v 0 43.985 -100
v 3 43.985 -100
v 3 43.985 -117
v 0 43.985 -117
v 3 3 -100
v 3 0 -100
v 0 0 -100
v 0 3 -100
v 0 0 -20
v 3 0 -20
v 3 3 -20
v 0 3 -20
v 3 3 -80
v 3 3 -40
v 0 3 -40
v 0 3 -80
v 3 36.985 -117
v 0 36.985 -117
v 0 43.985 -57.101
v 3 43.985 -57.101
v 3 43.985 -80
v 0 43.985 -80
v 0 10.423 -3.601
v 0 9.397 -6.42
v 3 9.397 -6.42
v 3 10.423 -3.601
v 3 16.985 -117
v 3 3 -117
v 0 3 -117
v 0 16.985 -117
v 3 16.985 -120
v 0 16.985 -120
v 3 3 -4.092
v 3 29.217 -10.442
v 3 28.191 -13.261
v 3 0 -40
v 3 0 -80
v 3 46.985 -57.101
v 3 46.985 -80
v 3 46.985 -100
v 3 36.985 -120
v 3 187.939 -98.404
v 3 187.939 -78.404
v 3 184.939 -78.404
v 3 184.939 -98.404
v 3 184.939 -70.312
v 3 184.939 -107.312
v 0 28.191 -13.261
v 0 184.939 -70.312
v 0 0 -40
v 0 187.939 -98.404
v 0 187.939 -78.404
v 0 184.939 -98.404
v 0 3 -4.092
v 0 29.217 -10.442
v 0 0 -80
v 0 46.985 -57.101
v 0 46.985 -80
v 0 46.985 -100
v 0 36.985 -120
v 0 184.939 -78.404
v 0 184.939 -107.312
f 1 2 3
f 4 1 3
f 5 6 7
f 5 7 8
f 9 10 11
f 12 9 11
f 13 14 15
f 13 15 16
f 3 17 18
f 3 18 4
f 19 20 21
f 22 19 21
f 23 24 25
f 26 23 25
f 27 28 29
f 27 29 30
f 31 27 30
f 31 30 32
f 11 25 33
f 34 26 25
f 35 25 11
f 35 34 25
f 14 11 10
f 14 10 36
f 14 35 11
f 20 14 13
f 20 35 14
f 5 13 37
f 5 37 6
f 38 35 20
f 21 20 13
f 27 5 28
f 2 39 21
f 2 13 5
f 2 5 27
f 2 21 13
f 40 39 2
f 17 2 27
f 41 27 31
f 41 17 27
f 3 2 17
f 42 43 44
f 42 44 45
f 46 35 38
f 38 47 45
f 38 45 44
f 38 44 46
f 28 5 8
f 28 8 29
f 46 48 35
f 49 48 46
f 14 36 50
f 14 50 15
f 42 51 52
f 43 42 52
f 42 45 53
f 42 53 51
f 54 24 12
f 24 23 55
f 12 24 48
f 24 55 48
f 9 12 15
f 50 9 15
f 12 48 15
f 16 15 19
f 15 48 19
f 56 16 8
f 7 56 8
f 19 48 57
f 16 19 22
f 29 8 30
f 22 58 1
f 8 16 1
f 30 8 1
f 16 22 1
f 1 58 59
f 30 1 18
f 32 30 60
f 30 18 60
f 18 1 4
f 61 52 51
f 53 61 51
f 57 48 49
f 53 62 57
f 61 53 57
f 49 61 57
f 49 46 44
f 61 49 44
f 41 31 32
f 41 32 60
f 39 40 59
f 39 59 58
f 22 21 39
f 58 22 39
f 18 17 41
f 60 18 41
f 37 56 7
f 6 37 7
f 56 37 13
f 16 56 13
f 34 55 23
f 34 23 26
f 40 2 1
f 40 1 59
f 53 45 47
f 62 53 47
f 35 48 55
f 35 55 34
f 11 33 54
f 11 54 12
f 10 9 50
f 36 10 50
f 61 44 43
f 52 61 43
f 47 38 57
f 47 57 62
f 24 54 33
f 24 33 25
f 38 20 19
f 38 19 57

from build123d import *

# Parameters (mm, degrees)
BOSS_EXTRUDE1_DEPTH = 3
CUT_EXTRUDE1_DEPTH  = 267.131484195
SKETCH3_W           = 29.976768642
SKETCH3_H           = 52.268511193
CUT_EXTRUDE2_DEPTH  = 233.651187464
SKETCH5_W           = 11.091910703
SKETCH5_H           = 3
SKETCH5_W_2         = 10
CUT_EXTRUDE4_DEPTH  = 224.001992956
SKETCH6_W           = 20
SKETCH6_H           = 3
CUT_EXTRUDE5_DEPTH  = 224.001992956
SKETCH7_W           = 40
SKETCH7_H           = 3
CUT_EXTRUDE6_DEPTH  = 224.001992956
SKETCH8_W           = 20
SKETCH8_H           = 3
SKETCH8_W_2         = 22.898992834
CUT_EXTRUDE7_DEPTH  = 224.001992956
SKETCH10_W          = 3
SKETCH10_H          = 7
SKETCH10_H_2        = 13.984631039
CUT_EXTRUDE9_DEPTH  = 224.001992956
CUT_EXTRUDE10_REACH = 225.002
SKETCH12_W          = 3
SKETCH12_H          = 20
BOSS_EXTRUDE2_DEPTH = 3


with BuildPart() as part:
    # Sketch1 → Boss-Extrude1 (new body)
    with BuildSketch(Plane(origin=(0, 0, 0), x_dir=(0, 0, -1), z_dir=(1, 0, 0))):
        Polygon((0, 0), (120, 0), (188.404028665, 187.938524157), (68.404028665, 187.938524157), align=None)
    extrude(amount=BOSS_EXTRUDE1_DEPTH)

    # Sketch2 → Cut-Extrude1 (cut, through all)
    with BuildSketch(Plane(origin=(3, 0, 0), x_dir=(0, 0, -1), z_dir=(1, 0, 0))):
        Polygon((188.404028665, 187.938524157), (137.101007166, 46.984631039), (57.101007166, 46.984631039), (108.404028665, 187.938524157), align=None)
    extrude(amount=-CUT_EXTRUDE1_DEPTH, mode=Mode.SUBTRACT)

    # Sketch3 → Cut-Extrude2 (cut, through all)
    with BuildSketch(Plane(origin=(3, 0, 0), x_dir=(0, 0, -1), z_dir=(1, 0, 0))):
        with Locations((134.988384321, 26.134255597)):
            Rectangle(SKETCH3_W, SKETCH3_H)
    extrude(amount=-CUT_EXTRUDE2_DEPTH, mode=Mode.SUBTRACT)

    # Sketch5 → Cut-Extrude4 (cut, through all)
    with BuildSketch(Plane(origin=(3, 0, 0), x_dir=(0, 0, -1), z_dir=(1, 0, 0))):
        with Locations((72.858073314, 186.438524157)):
            Rectangle(SKETCH5_W, SKETCH5_H)
        with Locations((103.404028665, 186.438524157)):
            Rectangle(SKETCH5_W_2, SKETCH5_H)
    extrude(amount=-CUT_EXTRUDE4_DEPTH, mode=Mode.SUBTRACT)

    # Sketch6 → Cut-Extrude5 (cut, through all)
    with BuildSketch(Plane(origin=(3, 0, 0), x_dir=(0, 0, -1), z_dir=(1, 0, 0))):
        with Locations((110, 1.5)):
            Rectangle(SKETCH6_W, SKETCH6_H)
        with Locations((10, 1.5)):
            Rectangle(SKETCH6_W, SKETCH6_H)
    extrude(amount=-CUT_EXTRUDE5_DEPTH, mode=Mode.SUBTRACT)

    # Sketch7 → Cut-Extrude6 (cut, through all)
    with BuildSketch(Plane(origin=(3, 0, 0), x_dir=(0, 0, -1), z_dir=(1, 0, 0))):
        with Locations((60, 1.5)):
            Rectangle(SKETCH7_W, SKETCH7_H)
    extrude(amount=-CUT_EXTRUDE6_DEPTH, mode=Mode.SUBTRACT)

    # Sketch8 → Cut-Extrude7 (cut, through all)
    with BuildSketch(Plane(origin=(3, 0, 0), x_dir=(0, 0, -1), z_dir=(1, 0, 0))):
        with Locations((110, 45.484631039)):
            Rectangle(SKETCH8_W, SKETCH8_H)
        with Locations((68.550503583, 45.484631039)):
            Rectangle(SKETCH8_W_2, SKETCH8_H)
    extrude(amount=-CUT_EXTRUDE7_DEPTH, mode=Mode.SUBTRACT)

    # Sketch10 → Cut-Extrude9 (cut, through all)
    with BuildSketch(Plane(origin=(3, 0, 0), x_dir=(0, 0, -1), z_dir=(1, 0, 0))):
        with Locations((118.5, 40.484631039)):
            Rectangle(SKETCH10_W, SKETCH10_H)
        with Locations((118.5, 9.992315519)):
            Rectangle(SKETCH10_W, SKETCH10_H_2)
    extrude(amount=-CUT_EXTRUDE9_DEPTH, mode=Mode.SUBTRACT)

    # Sketch11 → Cut-Extrude10 (cut, up to next)
    with BuildSketch(Plane.ZY, mode=Mode.PRIVATE) as cut_extrude10_sk1:
        Polygon((-67.312117962, 184.938524157), (-1.091910703, 3), (-4.091910703, 3), (-70.312117962, 184.938524157), align=None)
    cut_extrude10_tool1 = extrude(cut_extrude10_sk1.sketch, amount=-CUT_EXTRUDE10_REACH, mode=Mode.PRIVATE) & part.part
    add(cut_extrude10_tool1.solids().sort_by_distance((0, 93.969262, -35.702014))[0], mode=Mode.SUBTRACT)

    # Sketch12 → Boss-Extrude2 (add)
    with BuildSketch(Plane(origin=(0, -0.964181415, -2.649066665), x_dir=(1, 0, 0), z_dir=(0, 0.34202014332566577, 0.9396926207859095))):
        with Locations((1.5, 21.02606043)):
            Rectangle(SKETCH12_W, SKETCH12_H)
    extrude(amount=BOSS_EXTRUDE2_DEPTH)


solid = part.part
